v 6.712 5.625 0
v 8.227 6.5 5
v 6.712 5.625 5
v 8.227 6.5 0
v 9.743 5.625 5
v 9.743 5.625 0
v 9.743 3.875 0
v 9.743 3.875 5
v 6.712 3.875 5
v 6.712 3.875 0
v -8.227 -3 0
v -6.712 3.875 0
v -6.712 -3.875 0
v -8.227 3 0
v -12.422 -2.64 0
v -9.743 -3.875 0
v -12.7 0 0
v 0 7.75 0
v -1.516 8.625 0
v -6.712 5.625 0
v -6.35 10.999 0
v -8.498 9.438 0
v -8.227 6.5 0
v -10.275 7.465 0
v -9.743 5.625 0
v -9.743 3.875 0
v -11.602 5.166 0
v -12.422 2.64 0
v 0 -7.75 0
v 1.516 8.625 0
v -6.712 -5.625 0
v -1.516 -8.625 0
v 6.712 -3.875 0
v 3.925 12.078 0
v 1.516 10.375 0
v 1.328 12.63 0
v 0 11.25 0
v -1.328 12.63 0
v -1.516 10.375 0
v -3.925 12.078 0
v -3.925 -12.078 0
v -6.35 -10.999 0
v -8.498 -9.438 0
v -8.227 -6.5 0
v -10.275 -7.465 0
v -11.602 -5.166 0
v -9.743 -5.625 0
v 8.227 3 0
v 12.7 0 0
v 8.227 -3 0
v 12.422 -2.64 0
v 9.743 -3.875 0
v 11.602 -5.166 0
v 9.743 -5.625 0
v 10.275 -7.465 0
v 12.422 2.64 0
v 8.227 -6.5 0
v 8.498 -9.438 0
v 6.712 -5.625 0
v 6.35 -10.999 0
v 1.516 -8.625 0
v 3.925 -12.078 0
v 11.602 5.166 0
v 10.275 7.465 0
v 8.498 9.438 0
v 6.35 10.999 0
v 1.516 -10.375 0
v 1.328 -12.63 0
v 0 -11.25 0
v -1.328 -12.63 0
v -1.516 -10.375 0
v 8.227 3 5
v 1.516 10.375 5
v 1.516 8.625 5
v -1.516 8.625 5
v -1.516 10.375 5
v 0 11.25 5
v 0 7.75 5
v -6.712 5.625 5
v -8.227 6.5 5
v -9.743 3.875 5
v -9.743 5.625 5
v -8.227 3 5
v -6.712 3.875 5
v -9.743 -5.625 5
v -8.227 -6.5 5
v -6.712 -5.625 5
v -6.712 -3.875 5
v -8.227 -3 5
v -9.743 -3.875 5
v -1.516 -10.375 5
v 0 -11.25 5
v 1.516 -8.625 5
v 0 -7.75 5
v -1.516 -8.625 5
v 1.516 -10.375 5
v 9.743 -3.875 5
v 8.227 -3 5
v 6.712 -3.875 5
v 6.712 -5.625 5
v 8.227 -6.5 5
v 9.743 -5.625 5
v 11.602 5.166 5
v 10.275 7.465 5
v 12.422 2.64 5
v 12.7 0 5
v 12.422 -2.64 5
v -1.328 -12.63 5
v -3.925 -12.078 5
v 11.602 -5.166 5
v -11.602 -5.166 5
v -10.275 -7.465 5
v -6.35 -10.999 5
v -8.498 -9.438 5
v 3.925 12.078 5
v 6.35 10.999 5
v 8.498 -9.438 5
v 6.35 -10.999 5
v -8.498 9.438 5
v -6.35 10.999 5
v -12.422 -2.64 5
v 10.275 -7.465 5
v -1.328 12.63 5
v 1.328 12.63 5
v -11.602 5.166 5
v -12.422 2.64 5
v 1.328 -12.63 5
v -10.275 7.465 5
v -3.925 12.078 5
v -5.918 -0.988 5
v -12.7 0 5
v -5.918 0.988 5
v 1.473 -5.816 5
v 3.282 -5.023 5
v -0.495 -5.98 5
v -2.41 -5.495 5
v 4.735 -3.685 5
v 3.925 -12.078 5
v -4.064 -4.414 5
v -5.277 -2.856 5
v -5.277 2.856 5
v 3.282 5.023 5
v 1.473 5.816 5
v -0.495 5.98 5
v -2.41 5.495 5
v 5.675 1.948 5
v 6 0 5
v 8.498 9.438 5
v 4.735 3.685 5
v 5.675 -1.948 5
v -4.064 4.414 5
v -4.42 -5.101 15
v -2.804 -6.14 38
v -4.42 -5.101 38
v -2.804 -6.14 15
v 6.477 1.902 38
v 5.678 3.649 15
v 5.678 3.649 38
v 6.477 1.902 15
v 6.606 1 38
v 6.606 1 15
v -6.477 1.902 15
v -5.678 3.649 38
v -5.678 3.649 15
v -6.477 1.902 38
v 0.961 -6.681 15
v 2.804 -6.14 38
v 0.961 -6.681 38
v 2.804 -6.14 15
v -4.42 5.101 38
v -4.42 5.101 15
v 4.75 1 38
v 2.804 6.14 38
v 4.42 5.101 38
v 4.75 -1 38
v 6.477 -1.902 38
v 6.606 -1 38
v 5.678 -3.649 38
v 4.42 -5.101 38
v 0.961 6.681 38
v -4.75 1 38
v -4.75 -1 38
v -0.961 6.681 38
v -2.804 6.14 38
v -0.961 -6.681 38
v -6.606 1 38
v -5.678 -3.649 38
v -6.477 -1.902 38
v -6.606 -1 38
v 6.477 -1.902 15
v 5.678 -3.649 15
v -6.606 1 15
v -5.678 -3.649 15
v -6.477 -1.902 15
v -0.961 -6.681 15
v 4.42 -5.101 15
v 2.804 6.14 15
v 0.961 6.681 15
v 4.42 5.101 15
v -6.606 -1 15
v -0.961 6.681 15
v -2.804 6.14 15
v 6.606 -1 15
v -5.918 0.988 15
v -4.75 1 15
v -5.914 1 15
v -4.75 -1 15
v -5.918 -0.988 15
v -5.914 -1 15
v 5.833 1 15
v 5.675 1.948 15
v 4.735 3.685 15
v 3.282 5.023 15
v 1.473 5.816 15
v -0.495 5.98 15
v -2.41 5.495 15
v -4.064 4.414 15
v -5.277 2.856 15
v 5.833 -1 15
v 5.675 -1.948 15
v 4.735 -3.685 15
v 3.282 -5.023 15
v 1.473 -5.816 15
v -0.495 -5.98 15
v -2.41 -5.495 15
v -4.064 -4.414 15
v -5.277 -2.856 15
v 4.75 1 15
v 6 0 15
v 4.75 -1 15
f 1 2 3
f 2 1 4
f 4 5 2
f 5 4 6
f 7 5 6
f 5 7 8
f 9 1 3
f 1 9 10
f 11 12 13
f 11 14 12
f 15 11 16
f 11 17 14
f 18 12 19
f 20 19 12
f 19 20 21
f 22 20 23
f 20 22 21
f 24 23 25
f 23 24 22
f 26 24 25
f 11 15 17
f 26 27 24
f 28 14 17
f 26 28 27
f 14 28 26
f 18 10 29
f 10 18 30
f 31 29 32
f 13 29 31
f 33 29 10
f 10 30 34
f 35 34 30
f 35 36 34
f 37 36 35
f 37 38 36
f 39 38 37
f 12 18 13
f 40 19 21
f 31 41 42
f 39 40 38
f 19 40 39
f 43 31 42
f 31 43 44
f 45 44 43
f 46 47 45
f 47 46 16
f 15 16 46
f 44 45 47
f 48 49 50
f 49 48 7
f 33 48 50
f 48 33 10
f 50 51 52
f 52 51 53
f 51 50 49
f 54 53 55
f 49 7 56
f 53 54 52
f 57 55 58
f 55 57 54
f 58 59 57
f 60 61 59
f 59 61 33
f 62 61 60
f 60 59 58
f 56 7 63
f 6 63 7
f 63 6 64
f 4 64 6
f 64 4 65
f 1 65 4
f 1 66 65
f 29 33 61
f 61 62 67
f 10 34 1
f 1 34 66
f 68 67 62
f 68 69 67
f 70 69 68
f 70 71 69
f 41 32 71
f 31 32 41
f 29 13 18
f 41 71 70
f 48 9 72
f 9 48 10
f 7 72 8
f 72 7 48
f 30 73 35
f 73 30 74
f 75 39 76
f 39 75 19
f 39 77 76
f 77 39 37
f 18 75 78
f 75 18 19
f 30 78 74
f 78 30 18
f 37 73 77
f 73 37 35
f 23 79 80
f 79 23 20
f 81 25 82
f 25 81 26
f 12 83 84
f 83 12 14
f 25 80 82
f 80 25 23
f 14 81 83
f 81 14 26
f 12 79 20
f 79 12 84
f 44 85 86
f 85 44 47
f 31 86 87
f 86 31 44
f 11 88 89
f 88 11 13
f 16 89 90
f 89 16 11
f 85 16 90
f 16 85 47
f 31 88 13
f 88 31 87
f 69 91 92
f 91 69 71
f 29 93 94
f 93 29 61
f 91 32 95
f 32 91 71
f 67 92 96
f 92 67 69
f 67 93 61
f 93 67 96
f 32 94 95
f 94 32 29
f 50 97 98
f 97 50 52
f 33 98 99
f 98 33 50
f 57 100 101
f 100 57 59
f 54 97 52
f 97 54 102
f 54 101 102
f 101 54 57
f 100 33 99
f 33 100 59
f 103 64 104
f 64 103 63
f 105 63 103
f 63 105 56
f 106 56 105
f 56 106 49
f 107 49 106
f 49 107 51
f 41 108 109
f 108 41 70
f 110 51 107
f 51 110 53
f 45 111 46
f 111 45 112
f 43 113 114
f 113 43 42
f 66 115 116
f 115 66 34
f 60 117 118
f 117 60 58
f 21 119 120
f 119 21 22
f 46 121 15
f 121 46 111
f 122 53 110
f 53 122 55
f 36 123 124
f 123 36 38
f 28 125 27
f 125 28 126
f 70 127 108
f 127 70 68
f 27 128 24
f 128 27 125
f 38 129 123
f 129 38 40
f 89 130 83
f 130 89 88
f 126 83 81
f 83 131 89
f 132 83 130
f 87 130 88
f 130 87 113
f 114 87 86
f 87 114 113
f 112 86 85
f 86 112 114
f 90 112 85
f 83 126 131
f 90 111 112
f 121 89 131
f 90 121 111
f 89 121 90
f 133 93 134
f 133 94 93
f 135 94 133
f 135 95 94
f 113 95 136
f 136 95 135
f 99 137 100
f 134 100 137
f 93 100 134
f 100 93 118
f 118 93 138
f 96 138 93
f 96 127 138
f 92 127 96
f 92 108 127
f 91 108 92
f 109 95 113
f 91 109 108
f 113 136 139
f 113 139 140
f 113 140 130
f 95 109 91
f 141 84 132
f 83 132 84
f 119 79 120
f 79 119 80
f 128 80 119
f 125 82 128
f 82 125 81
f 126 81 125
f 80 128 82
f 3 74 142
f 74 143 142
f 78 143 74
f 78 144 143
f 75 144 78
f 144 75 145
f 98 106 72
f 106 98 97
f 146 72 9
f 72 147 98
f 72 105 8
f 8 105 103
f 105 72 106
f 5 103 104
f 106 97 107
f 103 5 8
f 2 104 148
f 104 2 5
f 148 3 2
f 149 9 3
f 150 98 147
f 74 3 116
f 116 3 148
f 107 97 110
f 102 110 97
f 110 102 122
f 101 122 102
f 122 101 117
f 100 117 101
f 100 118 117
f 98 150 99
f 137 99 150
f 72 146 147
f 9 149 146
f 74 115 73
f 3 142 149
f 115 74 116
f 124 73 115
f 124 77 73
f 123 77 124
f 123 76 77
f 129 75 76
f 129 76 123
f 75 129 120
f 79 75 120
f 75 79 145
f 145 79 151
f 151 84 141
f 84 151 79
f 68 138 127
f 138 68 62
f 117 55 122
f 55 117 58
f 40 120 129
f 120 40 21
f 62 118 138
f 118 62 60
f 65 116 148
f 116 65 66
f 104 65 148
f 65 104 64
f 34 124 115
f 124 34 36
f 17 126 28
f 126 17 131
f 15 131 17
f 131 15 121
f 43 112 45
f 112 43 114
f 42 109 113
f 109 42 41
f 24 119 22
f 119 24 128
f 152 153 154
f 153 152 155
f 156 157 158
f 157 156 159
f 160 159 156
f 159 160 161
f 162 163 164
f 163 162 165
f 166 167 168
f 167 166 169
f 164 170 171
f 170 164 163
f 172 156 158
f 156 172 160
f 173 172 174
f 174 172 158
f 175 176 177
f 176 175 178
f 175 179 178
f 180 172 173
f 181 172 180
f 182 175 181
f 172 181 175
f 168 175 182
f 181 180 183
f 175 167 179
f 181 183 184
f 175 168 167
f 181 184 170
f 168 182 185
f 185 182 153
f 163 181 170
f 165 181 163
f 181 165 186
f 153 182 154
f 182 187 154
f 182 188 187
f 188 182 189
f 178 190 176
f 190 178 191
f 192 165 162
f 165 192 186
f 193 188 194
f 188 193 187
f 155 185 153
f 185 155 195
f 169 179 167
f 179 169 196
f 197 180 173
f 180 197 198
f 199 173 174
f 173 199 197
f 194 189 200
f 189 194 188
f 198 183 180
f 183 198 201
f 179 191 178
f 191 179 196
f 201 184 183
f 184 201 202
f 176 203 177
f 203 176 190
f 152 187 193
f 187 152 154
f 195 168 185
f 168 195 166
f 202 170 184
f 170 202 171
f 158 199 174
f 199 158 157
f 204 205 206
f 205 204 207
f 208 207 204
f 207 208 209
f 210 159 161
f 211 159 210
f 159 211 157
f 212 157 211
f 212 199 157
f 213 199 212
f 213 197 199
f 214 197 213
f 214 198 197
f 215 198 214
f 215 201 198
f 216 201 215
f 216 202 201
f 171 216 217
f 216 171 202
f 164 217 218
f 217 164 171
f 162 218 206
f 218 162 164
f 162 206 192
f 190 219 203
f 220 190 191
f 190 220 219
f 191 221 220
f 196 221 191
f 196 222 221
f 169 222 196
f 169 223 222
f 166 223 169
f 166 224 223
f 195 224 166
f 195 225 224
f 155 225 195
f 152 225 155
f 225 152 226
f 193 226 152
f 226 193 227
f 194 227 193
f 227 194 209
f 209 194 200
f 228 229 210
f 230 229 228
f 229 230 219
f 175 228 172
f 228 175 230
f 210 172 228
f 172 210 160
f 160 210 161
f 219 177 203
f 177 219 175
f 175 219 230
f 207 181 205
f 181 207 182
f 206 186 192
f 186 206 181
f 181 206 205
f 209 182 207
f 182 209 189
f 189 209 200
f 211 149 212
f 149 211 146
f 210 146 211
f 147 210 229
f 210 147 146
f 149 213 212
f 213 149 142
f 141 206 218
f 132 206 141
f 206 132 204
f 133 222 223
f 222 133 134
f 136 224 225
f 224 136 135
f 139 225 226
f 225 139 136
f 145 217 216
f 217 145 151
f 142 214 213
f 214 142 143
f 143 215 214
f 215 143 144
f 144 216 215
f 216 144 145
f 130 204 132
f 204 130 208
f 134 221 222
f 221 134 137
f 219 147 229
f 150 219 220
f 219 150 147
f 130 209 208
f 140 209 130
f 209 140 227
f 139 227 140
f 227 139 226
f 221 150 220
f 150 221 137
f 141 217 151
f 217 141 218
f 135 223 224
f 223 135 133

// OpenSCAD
motor_mount_radius = 25.4 / 2;
motor_mount_height = 5;

offset_radius = 6;
offset_height = 10;

wheel_adaptor_radius = 13.5 / 2;
wheel_adaptor_height = 23;

slot_size = 2;

screw_hole_radius = 1.75;
screw_hole_offset = 9.5;

axel_mount();

module axel_mount() {
	// motor mount
	difference() {
		cylinder(r=motor_mount_radius, h=motor_mount_height);
		mounting_holes();
	}

	// offset
	translate([0, 0, motor_mount_height]){
		cylinder(r=offset_radius, h=offset_height);
	}

	// wheel adaptor
	translate([0, 0, motor_mount_height + offset_height]){
		difference() {
			cylinder(r=wheel_adaptor_radius, h=wheel_adaptor_height);
			translate([wheel_adaptor_radius - slot_size, -slot_size / 2, 0])
				slot();
				translate([-wheel_adaptor_radius, -slot_size / 2, 0])
					slot();
		}
	}
}

module mounting_holes() {
	for (i = [0:5]){
		rotate([0,0,30 + 60 * i]) {
			translate([screw_hole_offset, 0, 0]){
				cylinder(r=screw_hole_radius, h=wheel_adaptor_height);
			}
		}
	}
}

module slot() {
	cube([slot_size, slot_size, wheel_adaptor_height]);
}
